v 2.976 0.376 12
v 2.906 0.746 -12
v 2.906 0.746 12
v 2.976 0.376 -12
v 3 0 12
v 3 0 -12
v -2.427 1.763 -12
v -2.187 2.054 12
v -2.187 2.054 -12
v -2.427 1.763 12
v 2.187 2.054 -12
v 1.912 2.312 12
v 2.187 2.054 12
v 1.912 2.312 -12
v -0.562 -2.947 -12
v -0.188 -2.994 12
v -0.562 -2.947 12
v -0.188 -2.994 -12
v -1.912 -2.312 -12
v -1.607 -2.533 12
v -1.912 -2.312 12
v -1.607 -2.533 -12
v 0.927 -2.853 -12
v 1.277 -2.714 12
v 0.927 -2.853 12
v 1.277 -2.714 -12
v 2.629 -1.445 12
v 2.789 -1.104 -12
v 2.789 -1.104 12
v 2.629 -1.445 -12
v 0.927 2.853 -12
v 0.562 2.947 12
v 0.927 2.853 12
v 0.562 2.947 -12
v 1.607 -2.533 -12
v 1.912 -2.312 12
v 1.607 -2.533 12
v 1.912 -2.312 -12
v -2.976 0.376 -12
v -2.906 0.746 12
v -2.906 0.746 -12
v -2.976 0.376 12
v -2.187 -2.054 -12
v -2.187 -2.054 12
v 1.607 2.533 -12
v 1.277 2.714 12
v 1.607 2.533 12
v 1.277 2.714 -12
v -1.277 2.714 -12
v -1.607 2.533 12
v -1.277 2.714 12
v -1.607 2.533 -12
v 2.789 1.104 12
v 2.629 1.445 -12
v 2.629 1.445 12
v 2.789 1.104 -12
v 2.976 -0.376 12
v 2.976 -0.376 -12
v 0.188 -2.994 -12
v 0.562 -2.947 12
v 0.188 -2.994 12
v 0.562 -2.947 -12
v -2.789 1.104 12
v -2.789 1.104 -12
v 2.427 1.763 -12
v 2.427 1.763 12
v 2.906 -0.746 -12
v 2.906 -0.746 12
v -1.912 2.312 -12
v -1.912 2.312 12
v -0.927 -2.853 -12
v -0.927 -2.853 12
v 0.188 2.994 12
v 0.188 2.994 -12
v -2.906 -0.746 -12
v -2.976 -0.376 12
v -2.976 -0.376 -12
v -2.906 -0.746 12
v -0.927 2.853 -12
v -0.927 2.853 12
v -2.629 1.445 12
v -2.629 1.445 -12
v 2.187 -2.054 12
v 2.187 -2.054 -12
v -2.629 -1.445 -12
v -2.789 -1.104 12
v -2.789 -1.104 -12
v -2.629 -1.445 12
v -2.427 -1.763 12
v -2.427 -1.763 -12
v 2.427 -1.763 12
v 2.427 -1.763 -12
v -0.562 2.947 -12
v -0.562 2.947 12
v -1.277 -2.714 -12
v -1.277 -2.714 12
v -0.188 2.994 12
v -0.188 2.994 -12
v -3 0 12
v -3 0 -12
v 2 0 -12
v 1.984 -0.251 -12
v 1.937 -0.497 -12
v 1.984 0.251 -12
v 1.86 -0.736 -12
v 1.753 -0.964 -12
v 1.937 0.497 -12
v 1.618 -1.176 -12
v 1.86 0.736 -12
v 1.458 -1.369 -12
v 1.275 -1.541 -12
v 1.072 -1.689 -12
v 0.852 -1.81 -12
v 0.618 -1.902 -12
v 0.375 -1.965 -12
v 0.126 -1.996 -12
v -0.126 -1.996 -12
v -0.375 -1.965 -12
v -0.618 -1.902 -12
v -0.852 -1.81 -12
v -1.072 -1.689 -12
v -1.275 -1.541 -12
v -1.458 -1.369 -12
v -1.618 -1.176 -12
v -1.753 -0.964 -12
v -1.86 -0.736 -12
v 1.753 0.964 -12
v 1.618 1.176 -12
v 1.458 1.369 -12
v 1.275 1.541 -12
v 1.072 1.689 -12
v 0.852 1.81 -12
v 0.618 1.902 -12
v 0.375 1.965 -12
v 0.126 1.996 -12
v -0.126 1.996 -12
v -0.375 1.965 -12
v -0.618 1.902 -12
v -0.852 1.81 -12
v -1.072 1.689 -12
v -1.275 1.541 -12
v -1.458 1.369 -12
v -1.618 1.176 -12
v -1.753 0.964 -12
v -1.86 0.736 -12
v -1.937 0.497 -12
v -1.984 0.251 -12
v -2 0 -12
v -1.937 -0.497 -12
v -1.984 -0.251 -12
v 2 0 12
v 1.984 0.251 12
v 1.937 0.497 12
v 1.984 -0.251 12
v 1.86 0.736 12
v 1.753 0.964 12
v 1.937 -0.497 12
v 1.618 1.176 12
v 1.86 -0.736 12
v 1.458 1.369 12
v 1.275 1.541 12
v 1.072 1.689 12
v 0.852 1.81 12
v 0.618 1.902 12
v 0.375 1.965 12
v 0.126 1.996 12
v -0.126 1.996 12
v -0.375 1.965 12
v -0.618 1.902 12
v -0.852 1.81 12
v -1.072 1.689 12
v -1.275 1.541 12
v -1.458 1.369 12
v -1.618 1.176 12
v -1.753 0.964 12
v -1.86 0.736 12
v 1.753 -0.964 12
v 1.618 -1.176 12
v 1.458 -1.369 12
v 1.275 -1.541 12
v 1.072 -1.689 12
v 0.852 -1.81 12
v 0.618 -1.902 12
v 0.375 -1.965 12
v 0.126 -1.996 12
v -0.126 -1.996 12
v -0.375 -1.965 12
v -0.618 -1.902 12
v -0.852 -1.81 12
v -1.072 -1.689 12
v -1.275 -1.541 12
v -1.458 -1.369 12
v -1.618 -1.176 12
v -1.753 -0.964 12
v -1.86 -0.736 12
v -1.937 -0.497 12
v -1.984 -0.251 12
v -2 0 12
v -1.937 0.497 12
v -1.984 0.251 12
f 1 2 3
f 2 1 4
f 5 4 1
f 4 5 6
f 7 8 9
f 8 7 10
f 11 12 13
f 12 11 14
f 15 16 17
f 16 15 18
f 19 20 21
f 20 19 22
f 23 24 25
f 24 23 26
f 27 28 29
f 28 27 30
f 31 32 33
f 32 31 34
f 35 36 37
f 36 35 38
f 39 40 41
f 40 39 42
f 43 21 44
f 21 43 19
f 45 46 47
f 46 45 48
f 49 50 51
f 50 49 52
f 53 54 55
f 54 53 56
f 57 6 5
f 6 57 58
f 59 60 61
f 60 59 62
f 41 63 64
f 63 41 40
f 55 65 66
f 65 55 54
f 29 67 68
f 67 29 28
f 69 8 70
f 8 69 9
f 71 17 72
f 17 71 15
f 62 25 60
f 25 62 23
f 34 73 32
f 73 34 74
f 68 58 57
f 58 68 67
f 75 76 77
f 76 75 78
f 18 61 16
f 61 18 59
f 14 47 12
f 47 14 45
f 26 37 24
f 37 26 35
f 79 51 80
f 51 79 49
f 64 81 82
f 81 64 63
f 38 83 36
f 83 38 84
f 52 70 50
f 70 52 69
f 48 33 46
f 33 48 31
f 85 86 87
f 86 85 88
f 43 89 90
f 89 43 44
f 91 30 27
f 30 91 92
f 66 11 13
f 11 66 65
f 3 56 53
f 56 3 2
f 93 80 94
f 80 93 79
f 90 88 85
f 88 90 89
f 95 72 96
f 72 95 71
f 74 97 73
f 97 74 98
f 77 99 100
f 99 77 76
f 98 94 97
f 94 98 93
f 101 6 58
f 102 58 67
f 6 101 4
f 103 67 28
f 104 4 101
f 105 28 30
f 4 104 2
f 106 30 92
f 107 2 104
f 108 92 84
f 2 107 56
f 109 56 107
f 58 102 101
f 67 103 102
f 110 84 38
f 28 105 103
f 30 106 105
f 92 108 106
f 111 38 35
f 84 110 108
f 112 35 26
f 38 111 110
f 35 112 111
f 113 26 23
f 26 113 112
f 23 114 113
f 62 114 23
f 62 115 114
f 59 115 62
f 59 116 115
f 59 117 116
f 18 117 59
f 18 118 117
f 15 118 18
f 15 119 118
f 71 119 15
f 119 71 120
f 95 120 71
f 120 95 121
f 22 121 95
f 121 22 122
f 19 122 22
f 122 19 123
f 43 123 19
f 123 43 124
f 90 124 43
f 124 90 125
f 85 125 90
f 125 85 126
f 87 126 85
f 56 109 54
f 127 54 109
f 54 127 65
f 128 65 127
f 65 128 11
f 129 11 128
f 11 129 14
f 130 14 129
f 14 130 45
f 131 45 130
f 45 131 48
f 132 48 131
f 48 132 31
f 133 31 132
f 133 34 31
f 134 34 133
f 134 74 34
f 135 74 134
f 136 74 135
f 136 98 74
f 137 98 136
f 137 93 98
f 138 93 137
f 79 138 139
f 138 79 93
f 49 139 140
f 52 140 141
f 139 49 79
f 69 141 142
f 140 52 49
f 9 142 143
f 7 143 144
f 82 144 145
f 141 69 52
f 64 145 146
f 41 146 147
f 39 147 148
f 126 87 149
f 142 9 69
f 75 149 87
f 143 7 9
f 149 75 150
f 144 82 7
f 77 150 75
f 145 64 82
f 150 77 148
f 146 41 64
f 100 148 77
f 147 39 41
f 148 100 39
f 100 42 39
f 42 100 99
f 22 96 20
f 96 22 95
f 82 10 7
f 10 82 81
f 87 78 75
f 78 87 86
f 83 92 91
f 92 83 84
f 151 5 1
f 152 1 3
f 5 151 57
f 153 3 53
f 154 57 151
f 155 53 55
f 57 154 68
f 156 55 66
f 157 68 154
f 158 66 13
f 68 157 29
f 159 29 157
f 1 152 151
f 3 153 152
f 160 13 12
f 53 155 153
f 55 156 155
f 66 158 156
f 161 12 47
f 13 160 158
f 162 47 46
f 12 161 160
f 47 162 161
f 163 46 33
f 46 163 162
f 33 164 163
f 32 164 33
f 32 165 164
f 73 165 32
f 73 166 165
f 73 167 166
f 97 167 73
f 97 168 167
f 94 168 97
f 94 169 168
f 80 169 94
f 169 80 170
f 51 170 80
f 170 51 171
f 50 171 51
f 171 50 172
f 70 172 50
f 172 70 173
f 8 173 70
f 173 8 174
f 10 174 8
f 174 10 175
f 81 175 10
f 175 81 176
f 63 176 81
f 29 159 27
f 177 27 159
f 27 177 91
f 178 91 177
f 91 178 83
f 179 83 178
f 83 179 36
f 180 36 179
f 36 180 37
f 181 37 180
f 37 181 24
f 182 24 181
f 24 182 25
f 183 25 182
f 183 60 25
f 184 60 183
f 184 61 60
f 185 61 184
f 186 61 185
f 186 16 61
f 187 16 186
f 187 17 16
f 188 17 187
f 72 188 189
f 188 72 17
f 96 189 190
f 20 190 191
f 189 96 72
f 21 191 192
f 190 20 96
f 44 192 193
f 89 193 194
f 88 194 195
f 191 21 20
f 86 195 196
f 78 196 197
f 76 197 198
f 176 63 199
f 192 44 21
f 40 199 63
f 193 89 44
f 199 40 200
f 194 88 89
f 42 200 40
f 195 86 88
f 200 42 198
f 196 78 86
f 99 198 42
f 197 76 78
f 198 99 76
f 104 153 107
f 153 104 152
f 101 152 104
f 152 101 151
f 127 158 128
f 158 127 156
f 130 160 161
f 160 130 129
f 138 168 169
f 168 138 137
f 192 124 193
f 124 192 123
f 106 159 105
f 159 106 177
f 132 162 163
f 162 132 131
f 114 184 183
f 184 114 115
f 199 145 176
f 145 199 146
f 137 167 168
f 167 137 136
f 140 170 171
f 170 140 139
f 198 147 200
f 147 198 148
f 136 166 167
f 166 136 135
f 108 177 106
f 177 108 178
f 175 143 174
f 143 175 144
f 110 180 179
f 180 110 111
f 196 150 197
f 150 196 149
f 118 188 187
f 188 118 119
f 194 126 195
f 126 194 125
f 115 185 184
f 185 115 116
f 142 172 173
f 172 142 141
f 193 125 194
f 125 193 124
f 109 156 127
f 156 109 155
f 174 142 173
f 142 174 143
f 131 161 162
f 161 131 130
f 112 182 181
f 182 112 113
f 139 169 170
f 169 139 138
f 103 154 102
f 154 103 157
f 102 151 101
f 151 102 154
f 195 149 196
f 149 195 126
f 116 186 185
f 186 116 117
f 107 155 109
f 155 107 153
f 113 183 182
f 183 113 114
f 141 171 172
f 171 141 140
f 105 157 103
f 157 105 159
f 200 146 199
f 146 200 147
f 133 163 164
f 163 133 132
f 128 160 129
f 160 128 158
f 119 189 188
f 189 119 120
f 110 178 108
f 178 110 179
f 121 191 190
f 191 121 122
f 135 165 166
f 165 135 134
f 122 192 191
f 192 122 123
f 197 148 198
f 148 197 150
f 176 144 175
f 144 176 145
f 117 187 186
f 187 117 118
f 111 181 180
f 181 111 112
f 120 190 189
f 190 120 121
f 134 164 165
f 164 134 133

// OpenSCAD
$fn = 50;


difference() {
	union() {
		translate(v = [0, 0, -12.0000000000]) {
			cylinder(h = 24, r = 3.0000000000);
		}
	}
	union() {
		translate(v = [0, 0, -100.0000000000]) {
			cylinder(h = 200, r = 2.0000000000);
		}
	}
}
